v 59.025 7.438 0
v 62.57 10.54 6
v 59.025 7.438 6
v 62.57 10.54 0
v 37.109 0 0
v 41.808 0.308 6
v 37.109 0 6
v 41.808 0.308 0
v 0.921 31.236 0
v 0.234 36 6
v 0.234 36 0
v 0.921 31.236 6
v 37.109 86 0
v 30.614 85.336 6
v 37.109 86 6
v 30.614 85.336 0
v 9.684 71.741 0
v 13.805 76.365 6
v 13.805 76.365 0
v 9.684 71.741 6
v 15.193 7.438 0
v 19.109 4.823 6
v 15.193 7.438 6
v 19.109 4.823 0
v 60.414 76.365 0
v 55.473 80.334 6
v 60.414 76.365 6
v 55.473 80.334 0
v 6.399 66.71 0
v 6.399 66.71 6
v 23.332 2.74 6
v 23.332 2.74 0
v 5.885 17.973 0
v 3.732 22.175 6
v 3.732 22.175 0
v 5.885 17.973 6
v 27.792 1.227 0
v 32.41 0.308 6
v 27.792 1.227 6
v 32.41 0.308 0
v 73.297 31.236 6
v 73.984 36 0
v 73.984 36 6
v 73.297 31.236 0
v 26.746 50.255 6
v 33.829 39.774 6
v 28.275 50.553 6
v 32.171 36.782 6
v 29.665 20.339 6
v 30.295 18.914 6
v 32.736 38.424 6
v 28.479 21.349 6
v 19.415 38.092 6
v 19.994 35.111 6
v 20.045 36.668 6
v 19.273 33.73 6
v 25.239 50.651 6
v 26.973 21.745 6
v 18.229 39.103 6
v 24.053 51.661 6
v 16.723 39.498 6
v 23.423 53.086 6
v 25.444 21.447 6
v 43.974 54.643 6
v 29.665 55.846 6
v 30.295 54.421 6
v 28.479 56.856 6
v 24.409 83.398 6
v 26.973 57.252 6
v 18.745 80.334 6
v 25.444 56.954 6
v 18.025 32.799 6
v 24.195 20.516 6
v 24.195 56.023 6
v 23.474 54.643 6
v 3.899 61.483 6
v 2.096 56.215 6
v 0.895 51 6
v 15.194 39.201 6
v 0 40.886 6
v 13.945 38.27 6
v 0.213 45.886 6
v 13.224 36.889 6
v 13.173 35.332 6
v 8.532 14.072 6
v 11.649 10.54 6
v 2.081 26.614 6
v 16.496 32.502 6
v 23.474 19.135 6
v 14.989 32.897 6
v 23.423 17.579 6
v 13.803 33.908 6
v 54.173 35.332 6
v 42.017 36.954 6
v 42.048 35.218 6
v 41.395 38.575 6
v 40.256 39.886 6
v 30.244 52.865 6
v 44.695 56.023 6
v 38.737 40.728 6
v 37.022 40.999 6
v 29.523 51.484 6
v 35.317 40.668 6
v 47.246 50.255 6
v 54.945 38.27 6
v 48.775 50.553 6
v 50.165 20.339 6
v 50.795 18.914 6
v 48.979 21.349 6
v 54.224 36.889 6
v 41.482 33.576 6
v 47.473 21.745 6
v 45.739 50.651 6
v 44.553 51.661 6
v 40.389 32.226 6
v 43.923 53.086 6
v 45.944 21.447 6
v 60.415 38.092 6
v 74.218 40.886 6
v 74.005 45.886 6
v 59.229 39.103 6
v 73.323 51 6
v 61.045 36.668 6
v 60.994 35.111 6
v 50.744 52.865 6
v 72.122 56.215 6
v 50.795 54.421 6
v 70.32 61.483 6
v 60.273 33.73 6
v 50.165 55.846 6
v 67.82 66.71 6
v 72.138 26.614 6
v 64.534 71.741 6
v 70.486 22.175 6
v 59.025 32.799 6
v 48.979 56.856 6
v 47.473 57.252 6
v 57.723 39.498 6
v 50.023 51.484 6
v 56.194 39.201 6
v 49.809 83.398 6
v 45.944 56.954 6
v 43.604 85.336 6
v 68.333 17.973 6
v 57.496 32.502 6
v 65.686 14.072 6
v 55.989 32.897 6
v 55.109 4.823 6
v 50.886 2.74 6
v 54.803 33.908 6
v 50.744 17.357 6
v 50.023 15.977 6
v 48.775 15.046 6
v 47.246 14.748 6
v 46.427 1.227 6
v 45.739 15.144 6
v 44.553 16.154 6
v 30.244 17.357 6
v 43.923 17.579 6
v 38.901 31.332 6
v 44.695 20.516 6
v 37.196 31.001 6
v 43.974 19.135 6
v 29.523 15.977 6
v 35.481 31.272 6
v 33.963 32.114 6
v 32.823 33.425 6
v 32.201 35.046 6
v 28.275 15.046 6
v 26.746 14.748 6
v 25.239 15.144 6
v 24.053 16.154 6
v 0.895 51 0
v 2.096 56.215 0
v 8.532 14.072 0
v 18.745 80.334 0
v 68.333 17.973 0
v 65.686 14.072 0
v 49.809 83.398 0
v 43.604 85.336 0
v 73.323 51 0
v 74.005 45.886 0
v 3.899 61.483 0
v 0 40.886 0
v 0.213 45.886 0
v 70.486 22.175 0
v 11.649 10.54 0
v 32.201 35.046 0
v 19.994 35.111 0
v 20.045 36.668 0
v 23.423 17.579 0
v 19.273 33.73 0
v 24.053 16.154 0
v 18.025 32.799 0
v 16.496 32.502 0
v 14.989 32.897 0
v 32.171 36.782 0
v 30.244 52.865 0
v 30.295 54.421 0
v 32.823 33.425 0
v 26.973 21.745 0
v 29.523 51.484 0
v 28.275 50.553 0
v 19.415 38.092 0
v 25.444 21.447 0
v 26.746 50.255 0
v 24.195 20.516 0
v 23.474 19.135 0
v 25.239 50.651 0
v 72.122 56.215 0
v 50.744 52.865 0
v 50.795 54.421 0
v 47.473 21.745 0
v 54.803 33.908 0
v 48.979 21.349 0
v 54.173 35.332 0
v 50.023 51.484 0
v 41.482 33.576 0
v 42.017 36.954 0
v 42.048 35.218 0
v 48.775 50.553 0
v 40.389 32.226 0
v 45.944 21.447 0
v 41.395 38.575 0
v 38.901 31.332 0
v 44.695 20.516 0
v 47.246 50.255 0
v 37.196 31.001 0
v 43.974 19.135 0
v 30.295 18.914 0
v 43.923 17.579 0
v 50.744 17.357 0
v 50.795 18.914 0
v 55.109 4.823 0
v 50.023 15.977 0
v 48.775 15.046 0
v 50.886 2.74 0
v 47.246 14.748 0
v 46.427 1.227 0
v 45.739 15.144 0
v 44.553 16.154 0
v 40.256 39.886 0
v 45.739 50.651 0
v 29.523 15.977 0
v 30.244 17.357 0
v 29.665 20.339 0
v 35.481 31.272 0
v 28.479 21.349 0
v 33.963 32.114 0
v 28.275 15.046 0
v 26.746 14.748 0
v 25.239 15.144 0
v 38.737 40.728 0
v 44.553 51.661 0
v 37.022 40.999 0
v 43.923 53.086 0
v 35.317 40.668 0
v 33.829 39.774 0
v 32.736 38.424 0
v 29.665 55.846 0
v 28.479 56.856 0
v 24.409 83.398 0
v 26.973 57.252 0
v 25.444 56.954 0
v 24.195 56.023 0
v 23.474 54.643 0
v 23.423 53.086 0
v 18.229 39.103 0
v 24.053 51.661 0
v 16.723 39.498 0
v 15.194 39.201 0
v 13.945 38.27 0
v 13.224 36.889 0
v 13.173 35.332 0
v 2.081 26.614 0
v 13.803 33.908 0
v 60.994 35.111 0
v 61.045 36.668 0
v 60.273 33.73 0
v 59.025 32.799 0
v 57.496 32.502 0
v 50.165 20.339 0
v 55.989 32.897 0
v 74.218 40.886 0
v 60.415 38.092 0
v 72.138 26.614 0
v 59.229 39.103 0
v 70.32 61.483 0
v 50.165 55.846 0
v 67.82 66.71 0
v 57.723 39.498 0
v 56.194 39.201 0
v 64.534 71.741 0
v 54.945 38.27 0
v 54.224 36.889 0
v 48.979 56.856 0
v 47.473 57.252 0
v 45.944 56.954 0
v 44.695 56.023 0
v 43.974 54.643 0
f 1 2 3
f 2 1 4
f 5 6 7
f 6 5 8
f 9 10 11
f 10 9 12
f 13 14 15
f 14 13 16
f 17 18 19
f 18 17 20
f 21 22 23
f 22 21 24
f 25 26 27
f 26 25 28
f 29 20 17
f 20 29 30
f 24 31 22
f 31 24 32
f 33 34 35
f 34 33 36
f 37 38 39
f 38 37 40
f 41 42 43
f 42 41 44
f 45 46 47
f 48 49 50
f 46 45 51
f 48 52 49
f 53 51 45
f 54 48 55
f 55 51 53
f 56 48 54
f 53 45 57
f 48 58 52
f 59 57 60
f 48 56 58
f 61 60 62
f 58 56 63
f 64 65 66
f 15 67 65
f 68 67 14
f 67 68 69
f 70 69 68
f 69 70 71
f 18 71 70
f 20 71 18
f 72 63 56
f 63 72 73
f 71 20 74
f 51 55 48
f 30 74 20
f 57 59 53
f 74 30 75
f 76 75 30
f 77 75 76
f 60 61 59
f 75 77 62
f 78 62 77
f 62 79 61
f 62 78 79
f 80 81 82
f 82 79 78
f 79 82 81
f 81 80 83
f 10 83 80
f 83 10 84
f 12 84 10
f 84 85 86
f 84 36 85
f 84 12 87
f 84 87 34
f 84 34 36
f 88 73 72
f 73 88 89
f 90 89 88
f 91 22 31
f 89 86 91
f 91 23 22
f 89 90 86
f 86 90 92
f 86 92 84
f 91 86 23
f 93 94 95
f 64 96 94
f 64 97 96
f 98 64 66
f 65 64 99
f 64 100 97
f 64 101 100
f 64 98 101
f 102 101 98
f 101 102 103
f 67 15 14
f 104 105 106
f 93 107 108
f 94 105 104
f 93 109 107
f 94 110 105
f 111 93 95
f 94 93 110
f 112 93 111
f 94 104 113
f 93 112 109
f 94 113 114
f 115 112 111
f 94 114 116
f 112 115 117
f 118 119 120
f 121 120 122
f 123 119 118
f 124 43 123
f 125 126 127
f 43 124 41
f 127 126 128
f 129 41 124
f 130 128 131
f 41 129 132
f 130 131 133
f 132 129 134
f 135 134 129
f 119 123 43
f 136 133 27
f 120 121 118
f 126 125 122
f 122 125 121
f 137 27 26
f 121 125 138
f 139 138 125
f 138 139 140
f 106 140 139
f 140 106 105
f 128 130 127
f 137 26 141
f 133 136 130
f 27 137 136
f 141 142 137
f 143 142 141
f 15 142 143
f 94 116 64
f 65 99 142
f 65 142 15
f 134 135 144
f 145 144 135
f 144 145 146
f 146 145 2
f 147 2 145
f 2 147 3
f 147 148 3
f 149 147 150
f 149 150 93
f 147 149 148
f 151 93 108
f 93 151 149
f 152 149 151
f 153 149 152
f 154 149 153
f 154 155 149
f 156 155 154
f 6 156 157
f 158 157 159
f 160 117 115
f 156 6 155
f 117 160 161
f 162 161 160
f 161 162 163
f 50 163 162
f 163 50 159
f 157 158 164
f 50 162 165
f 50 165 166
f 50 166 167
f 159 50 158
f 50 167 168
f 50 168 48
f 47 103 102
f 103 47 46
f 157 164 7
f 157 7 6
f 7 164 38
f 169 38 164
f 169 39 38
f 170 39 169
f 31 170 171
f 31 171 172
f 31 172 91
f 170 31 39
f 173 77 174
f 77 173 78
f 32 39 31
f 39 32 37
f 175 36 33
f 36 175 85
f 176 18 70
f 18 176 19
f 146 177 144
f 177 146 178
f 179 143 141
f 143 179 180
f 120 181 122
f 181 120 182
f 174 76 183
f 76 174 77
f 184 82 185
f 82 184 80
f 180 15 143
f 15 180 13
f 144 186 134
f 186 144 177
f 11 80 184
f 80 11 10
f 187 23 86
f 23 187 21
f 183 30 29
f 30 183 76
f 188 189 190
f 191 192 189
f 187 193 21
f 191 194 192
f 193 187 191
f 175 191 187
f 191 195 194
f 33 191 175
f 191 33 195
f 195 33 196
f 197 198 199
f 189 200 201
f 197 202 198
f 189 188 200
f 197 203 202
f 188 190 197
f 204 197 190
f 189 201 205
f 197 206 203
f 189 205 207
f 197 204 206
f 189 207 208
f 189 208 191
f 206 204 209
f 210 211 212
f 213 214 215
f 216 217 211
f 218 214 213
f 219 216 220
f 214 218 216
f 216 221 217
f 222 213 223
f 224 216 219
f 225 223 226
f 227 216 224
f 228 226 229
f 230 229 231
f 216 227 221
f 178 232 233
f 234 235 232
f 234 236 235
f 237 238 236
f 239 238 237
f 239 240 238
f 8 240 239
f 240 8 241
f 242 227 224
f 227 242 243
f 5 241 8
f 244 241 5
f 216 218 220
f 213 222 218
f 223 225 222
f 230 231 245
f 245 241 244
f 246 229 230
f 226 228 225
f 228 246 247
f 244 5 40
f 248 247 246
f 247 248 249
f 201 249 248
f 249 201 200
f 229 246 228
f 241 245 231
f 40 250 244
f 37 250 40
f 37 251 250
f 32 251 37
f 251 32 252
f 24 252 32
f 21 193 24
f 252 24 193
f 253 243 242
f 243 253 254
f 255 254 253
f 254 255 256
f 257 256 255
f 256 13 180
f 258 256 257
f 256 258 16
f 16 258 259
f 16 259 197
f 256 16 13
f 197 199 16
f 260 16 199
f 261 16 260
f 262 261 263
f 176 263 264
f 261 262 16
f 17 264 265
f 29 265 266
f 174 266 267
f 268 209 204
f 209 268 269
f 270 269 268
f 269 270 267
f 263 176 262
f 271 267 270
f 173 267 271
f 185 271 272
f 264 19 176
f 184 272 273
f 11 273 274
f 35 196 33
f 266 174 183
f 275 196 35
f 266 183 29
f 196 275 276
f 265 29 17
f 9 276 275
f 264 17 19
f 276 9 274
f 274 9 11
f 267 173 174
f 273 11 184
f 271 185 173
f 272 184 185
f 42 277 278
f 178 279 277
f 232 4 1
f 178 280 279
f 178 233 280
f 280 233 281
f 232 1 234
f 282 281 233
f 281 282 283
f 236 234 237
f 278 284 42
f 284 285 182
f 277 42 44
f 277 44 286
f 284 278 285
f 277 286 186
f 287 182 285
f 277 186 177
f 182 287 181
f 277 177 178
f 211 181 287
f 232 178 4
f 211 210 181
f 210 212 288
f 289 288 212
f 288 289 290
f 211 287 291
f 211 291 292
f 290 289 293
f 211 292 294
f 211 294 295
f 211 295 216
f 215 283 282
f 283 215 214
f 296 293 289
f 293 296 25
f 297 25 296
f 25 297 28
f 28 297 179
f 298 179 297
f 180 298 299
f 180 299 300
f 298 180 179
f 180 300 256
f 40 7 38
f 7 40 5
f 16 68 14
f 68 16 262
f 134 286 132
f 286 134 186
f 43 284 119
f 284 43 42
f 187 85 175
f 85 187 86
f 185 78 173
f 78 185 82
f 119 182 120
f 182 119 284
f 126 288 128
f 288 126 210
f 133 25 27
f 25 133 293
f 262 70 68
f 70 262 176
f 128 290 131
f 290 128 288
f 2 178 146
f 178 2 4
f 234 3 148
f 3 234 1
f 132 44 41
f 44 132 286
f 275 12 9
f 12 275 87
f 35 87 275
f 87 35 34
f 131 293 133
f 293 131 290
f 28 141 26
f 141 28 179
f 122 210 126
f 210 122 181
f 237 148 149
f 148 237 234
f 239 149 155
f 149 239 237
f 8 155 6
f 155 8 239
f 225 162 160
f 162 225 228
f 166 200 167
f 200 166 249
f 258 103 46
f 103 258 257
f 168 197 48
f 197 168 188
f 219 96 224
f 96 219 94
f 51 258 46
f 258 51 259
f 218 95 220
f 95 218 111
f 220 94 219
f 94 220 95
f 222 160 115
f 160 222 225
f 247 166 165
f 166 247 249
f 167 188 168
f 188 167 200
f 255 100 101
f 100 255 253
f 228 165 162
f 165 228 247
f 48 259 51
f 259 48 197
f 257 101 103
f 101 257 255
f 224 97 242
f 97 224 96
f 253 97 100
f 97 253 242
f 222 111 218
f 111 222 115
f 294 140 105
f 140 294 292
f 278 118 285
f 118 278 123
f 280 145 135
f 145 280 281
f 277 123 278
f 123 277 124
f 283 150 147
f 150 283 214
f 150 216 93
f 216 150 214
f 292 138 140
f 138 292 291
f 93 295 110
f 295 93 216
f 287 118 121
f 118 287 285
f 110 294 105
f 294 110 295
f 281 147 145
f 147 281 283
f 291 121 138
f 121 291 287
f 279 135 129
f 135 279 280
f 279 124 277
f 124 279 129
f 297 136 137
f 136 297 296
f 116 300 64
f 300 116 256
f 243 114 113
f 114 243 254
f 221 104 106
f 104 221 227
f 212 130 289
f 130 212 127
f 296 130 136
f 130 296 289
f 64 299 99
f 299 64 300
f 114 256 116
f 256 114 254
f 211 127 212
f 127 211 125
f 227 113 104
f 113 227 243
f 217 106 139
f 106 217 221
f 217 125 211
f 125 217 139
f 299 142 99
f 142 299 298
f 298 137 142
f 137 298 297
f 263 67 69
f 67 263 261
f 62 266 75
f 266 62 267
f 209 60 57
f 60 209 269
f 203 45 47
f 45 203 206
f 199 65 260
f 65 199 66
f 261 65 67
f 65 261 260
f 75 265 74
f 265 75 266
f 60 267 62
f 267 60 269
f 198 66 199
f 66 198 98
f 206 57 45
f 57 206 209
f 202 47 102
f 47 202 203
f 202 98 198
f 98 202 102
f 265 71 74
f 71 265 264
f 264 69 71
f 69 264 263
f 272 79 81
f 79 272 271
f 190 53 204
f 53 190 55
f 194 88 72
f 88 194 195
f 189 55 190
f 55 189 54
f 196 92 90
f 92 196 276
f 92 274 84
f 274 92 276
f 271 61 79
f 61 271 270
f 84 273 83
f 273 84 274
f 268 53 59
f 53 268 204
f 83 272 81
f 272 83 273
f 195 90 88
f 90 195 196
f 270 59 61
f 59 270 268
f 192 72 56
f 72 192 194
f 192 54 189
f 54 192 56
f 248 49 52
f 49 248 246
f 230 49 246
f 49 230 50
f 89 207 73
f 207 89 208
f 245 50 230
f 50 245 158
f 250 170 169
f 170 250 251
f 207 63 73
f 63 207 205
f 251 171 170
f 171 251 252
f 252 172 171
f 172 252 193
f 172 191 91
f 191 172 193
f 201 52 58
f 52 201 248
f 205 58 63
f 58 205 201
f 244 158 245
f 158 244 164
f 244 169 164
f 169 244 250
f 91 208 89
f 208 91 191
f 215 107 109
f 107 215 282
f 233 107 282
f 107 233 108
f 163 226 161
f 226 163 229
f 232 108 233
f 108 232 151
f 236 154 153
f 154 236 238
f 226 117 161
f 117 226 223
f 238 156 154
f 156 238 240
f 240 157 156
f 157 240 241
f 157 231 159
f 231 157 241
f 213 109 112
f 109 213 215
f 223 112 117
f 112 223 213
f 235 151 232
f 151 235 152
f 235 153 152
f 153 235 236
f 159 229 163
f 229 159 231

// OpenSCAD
$fn = 32;

// ----------------------------------------------------------------------
// Cam plate: single_lobe cam, base R36
// ----------------------------------------------------------------------

// --- parameters (mm) ---
base_r = 36;              // base circle radius
lobe_h = 14;              // cam lobe rise
bore_r = 5;               // shaft bore radius
plate_t = 6;              // plate thickness, Z (extrusion height)
ring_r = 20.5;            // lightening ring radius
bolt_r = 3.5;             // lightening hole radius
fit_tol = 0.05;           // declared fit tolerance (prompt contract)
free_tol = 0.2;           // declared free tolerance (prompt contract)

profile = [[73.984, 36], [74.218, 40.886], [74.005, 45.886], [73.323, 51], [72.122, 56.215], [70.32, 61.483], [67.82, 66.71], [64.534, 71.741], [60.414, 76.365], [55.473, 80.334], [49.809, 83.398], [43.604, 85.336], [37.109, 86], [30.614, 85.336], [24.409, 83.398], [18.745, 80.334], [13.805, 76.365], [9.684, 71.741], [6.399, 66.71], [3.899, 61.483], [2.096, 56.215], [0.895, 51], [0.213, 45.886], [0, 40.886], [0.234, 36], [0.921, 31.236], [2.081, 26.614], [3.732, 22.175], [5.885, 17.973], [8.532, 14.072], [11.649, 10.54], [15.193, 7.438], [19.109, 4.823], [23.332, 2.74], [27.792, 1.227], [32.41, 0.308], [37.109, 0], [41.808, 0.308], [46.427, 1.227], [50.886, 2.74], [55.109, 4.823], [59.025, 7.438], [62.57, 10.54], [65.686, 14.072], [68.333, 17.973], [70.486, 22.175], [72.138, 26.614], [73.297, 31.236]];  // primary outline, 48 points, counter clockwise
void_1 = [[42.017, 36.954], [41.395, 38.575], [40.256, 39.886], [38.737, 40.728], [37.022, 40.999], [35.317, 40.668], [33.829, 39.774], [32.736, 38.424], [32.171, 36.782], [32.201, 35.046], [32.823, 33.425], [33.963, 32.114], [35.481, 31.272], [37.196, 31.001], [38.901, 31.332], [40.389, 32.226], [41.482, 33.576], [42.048, 35.218]];  // shaft bore, 18 points
void_2 = [[61.045, 36.668], [60.415, 38.092], [59.229, 39.103], [57.723, 39.498], [56.194, 39.201], [54.945, 38.27], [54.224, 36.889], [54.173, 35.332], [54.803, 33.908], [55.989, 32.897], [57.496, 32.502], [59.025, 32.799], [60.273, 33.73], [60.994, 35.111]];  // lightening hole 1, 14 points
void_3 = [[50.795, 54.421], [50.165, 55.846], [48.979, 56.856], [47.473, 57.252], [45.944, 56.954], [44.695, 56.023], [43.974, 54.643], [43.923, 53.086], [44.553, 51.661], [45.739, 50.651], [47.246, 50.255], [48.775, 50.553], [50.023, 51.484], [50.744, 52.865]];  // lightening hole 2, 14 points
void_4 = [[30.295, 54.421], [29.665, 55.846], [28.479, 56.856], [26.973, 57.252], [25.444, 56.954], [24.195, 56.023], [23.474, 54.643], [23.423, 53.086], [24.053, 51.661], [25.239, 50.651], [26.746, 50.255], [28.275, 50.553], [29.523, 51.484], [30.244, 52.865]];  // lightening hole 3, 14 points
void_5 = [[20.045, 36.668], [19.415, 38.092], [18.229, 39.103], [16.723, 39.498], [15.194, 39.201], [13.945, 38.27], [13.224, 36.889], [13.173, 35.332], [13.803, 33.908], [14.989, 32.897], [16.496, 32.502], [18.025, 32.799], [19.273, 33.73], [19.994, 35.111]];  // lightening hole 4, 14 points
void_6 = [[30.295, 18.914], [29.665, 20.339], [28.479, 21.349], [26.973, 21.745], [25.444, 21.447], [24.195, 20.516], [23.474, 19.135], [23.423, 17.579], [24.053, 16.154], [25.239, 15.144], [26.746, 14.748], [28.275, 15.046], [29.523, 15.977], [30.244, 17.357]];  // lightening hole 5, 14 points
void_7 = [[50.795, 18.914], [50.165, 20.339], [48.979, 21.349], [47.473, 21.745], [45.944, 21.447], [44.695, 20.516], [43.974, 19.135], [43.923, 17.579], [44.553, 16.154], [45.739, 15.144], [47.246, 14.748], [48.775, 15.046], [50.023, 15.977], [50.744, 17.357]];  // lightening hole 6, 14 points

// --- the one profile operation ---
difference() {
  linear_extrude(height = plate_t) polygon(points = profile);
  translate([0, 0, -1])
    linear_extrude(height = plate_t + 2) polygon(points = void_1);
  translate([0, 0, -1])
    linear_extrude(height = plate_t + 2) polygon(points = void_2);
  translate([0, 0, -1])
    linear_extrude(height = plate_t + 2) polygon(points = void_3);
  translate([0, 0, -1])
    linear_extrude(height = plate_t + 2) polygon(points = void_4);
  translate([0, 0, -1])
    linear_extrude(height = plate_t + 2) polygon(points = void_5);
  translate([0, 0, -1])
    linear_extrude(height = plate_t + 2) polygon(points = void_6);
  translate([0, 0, -1])
    linear_extrude(height = plate_t + 2) polygon(points = void_7);
}
